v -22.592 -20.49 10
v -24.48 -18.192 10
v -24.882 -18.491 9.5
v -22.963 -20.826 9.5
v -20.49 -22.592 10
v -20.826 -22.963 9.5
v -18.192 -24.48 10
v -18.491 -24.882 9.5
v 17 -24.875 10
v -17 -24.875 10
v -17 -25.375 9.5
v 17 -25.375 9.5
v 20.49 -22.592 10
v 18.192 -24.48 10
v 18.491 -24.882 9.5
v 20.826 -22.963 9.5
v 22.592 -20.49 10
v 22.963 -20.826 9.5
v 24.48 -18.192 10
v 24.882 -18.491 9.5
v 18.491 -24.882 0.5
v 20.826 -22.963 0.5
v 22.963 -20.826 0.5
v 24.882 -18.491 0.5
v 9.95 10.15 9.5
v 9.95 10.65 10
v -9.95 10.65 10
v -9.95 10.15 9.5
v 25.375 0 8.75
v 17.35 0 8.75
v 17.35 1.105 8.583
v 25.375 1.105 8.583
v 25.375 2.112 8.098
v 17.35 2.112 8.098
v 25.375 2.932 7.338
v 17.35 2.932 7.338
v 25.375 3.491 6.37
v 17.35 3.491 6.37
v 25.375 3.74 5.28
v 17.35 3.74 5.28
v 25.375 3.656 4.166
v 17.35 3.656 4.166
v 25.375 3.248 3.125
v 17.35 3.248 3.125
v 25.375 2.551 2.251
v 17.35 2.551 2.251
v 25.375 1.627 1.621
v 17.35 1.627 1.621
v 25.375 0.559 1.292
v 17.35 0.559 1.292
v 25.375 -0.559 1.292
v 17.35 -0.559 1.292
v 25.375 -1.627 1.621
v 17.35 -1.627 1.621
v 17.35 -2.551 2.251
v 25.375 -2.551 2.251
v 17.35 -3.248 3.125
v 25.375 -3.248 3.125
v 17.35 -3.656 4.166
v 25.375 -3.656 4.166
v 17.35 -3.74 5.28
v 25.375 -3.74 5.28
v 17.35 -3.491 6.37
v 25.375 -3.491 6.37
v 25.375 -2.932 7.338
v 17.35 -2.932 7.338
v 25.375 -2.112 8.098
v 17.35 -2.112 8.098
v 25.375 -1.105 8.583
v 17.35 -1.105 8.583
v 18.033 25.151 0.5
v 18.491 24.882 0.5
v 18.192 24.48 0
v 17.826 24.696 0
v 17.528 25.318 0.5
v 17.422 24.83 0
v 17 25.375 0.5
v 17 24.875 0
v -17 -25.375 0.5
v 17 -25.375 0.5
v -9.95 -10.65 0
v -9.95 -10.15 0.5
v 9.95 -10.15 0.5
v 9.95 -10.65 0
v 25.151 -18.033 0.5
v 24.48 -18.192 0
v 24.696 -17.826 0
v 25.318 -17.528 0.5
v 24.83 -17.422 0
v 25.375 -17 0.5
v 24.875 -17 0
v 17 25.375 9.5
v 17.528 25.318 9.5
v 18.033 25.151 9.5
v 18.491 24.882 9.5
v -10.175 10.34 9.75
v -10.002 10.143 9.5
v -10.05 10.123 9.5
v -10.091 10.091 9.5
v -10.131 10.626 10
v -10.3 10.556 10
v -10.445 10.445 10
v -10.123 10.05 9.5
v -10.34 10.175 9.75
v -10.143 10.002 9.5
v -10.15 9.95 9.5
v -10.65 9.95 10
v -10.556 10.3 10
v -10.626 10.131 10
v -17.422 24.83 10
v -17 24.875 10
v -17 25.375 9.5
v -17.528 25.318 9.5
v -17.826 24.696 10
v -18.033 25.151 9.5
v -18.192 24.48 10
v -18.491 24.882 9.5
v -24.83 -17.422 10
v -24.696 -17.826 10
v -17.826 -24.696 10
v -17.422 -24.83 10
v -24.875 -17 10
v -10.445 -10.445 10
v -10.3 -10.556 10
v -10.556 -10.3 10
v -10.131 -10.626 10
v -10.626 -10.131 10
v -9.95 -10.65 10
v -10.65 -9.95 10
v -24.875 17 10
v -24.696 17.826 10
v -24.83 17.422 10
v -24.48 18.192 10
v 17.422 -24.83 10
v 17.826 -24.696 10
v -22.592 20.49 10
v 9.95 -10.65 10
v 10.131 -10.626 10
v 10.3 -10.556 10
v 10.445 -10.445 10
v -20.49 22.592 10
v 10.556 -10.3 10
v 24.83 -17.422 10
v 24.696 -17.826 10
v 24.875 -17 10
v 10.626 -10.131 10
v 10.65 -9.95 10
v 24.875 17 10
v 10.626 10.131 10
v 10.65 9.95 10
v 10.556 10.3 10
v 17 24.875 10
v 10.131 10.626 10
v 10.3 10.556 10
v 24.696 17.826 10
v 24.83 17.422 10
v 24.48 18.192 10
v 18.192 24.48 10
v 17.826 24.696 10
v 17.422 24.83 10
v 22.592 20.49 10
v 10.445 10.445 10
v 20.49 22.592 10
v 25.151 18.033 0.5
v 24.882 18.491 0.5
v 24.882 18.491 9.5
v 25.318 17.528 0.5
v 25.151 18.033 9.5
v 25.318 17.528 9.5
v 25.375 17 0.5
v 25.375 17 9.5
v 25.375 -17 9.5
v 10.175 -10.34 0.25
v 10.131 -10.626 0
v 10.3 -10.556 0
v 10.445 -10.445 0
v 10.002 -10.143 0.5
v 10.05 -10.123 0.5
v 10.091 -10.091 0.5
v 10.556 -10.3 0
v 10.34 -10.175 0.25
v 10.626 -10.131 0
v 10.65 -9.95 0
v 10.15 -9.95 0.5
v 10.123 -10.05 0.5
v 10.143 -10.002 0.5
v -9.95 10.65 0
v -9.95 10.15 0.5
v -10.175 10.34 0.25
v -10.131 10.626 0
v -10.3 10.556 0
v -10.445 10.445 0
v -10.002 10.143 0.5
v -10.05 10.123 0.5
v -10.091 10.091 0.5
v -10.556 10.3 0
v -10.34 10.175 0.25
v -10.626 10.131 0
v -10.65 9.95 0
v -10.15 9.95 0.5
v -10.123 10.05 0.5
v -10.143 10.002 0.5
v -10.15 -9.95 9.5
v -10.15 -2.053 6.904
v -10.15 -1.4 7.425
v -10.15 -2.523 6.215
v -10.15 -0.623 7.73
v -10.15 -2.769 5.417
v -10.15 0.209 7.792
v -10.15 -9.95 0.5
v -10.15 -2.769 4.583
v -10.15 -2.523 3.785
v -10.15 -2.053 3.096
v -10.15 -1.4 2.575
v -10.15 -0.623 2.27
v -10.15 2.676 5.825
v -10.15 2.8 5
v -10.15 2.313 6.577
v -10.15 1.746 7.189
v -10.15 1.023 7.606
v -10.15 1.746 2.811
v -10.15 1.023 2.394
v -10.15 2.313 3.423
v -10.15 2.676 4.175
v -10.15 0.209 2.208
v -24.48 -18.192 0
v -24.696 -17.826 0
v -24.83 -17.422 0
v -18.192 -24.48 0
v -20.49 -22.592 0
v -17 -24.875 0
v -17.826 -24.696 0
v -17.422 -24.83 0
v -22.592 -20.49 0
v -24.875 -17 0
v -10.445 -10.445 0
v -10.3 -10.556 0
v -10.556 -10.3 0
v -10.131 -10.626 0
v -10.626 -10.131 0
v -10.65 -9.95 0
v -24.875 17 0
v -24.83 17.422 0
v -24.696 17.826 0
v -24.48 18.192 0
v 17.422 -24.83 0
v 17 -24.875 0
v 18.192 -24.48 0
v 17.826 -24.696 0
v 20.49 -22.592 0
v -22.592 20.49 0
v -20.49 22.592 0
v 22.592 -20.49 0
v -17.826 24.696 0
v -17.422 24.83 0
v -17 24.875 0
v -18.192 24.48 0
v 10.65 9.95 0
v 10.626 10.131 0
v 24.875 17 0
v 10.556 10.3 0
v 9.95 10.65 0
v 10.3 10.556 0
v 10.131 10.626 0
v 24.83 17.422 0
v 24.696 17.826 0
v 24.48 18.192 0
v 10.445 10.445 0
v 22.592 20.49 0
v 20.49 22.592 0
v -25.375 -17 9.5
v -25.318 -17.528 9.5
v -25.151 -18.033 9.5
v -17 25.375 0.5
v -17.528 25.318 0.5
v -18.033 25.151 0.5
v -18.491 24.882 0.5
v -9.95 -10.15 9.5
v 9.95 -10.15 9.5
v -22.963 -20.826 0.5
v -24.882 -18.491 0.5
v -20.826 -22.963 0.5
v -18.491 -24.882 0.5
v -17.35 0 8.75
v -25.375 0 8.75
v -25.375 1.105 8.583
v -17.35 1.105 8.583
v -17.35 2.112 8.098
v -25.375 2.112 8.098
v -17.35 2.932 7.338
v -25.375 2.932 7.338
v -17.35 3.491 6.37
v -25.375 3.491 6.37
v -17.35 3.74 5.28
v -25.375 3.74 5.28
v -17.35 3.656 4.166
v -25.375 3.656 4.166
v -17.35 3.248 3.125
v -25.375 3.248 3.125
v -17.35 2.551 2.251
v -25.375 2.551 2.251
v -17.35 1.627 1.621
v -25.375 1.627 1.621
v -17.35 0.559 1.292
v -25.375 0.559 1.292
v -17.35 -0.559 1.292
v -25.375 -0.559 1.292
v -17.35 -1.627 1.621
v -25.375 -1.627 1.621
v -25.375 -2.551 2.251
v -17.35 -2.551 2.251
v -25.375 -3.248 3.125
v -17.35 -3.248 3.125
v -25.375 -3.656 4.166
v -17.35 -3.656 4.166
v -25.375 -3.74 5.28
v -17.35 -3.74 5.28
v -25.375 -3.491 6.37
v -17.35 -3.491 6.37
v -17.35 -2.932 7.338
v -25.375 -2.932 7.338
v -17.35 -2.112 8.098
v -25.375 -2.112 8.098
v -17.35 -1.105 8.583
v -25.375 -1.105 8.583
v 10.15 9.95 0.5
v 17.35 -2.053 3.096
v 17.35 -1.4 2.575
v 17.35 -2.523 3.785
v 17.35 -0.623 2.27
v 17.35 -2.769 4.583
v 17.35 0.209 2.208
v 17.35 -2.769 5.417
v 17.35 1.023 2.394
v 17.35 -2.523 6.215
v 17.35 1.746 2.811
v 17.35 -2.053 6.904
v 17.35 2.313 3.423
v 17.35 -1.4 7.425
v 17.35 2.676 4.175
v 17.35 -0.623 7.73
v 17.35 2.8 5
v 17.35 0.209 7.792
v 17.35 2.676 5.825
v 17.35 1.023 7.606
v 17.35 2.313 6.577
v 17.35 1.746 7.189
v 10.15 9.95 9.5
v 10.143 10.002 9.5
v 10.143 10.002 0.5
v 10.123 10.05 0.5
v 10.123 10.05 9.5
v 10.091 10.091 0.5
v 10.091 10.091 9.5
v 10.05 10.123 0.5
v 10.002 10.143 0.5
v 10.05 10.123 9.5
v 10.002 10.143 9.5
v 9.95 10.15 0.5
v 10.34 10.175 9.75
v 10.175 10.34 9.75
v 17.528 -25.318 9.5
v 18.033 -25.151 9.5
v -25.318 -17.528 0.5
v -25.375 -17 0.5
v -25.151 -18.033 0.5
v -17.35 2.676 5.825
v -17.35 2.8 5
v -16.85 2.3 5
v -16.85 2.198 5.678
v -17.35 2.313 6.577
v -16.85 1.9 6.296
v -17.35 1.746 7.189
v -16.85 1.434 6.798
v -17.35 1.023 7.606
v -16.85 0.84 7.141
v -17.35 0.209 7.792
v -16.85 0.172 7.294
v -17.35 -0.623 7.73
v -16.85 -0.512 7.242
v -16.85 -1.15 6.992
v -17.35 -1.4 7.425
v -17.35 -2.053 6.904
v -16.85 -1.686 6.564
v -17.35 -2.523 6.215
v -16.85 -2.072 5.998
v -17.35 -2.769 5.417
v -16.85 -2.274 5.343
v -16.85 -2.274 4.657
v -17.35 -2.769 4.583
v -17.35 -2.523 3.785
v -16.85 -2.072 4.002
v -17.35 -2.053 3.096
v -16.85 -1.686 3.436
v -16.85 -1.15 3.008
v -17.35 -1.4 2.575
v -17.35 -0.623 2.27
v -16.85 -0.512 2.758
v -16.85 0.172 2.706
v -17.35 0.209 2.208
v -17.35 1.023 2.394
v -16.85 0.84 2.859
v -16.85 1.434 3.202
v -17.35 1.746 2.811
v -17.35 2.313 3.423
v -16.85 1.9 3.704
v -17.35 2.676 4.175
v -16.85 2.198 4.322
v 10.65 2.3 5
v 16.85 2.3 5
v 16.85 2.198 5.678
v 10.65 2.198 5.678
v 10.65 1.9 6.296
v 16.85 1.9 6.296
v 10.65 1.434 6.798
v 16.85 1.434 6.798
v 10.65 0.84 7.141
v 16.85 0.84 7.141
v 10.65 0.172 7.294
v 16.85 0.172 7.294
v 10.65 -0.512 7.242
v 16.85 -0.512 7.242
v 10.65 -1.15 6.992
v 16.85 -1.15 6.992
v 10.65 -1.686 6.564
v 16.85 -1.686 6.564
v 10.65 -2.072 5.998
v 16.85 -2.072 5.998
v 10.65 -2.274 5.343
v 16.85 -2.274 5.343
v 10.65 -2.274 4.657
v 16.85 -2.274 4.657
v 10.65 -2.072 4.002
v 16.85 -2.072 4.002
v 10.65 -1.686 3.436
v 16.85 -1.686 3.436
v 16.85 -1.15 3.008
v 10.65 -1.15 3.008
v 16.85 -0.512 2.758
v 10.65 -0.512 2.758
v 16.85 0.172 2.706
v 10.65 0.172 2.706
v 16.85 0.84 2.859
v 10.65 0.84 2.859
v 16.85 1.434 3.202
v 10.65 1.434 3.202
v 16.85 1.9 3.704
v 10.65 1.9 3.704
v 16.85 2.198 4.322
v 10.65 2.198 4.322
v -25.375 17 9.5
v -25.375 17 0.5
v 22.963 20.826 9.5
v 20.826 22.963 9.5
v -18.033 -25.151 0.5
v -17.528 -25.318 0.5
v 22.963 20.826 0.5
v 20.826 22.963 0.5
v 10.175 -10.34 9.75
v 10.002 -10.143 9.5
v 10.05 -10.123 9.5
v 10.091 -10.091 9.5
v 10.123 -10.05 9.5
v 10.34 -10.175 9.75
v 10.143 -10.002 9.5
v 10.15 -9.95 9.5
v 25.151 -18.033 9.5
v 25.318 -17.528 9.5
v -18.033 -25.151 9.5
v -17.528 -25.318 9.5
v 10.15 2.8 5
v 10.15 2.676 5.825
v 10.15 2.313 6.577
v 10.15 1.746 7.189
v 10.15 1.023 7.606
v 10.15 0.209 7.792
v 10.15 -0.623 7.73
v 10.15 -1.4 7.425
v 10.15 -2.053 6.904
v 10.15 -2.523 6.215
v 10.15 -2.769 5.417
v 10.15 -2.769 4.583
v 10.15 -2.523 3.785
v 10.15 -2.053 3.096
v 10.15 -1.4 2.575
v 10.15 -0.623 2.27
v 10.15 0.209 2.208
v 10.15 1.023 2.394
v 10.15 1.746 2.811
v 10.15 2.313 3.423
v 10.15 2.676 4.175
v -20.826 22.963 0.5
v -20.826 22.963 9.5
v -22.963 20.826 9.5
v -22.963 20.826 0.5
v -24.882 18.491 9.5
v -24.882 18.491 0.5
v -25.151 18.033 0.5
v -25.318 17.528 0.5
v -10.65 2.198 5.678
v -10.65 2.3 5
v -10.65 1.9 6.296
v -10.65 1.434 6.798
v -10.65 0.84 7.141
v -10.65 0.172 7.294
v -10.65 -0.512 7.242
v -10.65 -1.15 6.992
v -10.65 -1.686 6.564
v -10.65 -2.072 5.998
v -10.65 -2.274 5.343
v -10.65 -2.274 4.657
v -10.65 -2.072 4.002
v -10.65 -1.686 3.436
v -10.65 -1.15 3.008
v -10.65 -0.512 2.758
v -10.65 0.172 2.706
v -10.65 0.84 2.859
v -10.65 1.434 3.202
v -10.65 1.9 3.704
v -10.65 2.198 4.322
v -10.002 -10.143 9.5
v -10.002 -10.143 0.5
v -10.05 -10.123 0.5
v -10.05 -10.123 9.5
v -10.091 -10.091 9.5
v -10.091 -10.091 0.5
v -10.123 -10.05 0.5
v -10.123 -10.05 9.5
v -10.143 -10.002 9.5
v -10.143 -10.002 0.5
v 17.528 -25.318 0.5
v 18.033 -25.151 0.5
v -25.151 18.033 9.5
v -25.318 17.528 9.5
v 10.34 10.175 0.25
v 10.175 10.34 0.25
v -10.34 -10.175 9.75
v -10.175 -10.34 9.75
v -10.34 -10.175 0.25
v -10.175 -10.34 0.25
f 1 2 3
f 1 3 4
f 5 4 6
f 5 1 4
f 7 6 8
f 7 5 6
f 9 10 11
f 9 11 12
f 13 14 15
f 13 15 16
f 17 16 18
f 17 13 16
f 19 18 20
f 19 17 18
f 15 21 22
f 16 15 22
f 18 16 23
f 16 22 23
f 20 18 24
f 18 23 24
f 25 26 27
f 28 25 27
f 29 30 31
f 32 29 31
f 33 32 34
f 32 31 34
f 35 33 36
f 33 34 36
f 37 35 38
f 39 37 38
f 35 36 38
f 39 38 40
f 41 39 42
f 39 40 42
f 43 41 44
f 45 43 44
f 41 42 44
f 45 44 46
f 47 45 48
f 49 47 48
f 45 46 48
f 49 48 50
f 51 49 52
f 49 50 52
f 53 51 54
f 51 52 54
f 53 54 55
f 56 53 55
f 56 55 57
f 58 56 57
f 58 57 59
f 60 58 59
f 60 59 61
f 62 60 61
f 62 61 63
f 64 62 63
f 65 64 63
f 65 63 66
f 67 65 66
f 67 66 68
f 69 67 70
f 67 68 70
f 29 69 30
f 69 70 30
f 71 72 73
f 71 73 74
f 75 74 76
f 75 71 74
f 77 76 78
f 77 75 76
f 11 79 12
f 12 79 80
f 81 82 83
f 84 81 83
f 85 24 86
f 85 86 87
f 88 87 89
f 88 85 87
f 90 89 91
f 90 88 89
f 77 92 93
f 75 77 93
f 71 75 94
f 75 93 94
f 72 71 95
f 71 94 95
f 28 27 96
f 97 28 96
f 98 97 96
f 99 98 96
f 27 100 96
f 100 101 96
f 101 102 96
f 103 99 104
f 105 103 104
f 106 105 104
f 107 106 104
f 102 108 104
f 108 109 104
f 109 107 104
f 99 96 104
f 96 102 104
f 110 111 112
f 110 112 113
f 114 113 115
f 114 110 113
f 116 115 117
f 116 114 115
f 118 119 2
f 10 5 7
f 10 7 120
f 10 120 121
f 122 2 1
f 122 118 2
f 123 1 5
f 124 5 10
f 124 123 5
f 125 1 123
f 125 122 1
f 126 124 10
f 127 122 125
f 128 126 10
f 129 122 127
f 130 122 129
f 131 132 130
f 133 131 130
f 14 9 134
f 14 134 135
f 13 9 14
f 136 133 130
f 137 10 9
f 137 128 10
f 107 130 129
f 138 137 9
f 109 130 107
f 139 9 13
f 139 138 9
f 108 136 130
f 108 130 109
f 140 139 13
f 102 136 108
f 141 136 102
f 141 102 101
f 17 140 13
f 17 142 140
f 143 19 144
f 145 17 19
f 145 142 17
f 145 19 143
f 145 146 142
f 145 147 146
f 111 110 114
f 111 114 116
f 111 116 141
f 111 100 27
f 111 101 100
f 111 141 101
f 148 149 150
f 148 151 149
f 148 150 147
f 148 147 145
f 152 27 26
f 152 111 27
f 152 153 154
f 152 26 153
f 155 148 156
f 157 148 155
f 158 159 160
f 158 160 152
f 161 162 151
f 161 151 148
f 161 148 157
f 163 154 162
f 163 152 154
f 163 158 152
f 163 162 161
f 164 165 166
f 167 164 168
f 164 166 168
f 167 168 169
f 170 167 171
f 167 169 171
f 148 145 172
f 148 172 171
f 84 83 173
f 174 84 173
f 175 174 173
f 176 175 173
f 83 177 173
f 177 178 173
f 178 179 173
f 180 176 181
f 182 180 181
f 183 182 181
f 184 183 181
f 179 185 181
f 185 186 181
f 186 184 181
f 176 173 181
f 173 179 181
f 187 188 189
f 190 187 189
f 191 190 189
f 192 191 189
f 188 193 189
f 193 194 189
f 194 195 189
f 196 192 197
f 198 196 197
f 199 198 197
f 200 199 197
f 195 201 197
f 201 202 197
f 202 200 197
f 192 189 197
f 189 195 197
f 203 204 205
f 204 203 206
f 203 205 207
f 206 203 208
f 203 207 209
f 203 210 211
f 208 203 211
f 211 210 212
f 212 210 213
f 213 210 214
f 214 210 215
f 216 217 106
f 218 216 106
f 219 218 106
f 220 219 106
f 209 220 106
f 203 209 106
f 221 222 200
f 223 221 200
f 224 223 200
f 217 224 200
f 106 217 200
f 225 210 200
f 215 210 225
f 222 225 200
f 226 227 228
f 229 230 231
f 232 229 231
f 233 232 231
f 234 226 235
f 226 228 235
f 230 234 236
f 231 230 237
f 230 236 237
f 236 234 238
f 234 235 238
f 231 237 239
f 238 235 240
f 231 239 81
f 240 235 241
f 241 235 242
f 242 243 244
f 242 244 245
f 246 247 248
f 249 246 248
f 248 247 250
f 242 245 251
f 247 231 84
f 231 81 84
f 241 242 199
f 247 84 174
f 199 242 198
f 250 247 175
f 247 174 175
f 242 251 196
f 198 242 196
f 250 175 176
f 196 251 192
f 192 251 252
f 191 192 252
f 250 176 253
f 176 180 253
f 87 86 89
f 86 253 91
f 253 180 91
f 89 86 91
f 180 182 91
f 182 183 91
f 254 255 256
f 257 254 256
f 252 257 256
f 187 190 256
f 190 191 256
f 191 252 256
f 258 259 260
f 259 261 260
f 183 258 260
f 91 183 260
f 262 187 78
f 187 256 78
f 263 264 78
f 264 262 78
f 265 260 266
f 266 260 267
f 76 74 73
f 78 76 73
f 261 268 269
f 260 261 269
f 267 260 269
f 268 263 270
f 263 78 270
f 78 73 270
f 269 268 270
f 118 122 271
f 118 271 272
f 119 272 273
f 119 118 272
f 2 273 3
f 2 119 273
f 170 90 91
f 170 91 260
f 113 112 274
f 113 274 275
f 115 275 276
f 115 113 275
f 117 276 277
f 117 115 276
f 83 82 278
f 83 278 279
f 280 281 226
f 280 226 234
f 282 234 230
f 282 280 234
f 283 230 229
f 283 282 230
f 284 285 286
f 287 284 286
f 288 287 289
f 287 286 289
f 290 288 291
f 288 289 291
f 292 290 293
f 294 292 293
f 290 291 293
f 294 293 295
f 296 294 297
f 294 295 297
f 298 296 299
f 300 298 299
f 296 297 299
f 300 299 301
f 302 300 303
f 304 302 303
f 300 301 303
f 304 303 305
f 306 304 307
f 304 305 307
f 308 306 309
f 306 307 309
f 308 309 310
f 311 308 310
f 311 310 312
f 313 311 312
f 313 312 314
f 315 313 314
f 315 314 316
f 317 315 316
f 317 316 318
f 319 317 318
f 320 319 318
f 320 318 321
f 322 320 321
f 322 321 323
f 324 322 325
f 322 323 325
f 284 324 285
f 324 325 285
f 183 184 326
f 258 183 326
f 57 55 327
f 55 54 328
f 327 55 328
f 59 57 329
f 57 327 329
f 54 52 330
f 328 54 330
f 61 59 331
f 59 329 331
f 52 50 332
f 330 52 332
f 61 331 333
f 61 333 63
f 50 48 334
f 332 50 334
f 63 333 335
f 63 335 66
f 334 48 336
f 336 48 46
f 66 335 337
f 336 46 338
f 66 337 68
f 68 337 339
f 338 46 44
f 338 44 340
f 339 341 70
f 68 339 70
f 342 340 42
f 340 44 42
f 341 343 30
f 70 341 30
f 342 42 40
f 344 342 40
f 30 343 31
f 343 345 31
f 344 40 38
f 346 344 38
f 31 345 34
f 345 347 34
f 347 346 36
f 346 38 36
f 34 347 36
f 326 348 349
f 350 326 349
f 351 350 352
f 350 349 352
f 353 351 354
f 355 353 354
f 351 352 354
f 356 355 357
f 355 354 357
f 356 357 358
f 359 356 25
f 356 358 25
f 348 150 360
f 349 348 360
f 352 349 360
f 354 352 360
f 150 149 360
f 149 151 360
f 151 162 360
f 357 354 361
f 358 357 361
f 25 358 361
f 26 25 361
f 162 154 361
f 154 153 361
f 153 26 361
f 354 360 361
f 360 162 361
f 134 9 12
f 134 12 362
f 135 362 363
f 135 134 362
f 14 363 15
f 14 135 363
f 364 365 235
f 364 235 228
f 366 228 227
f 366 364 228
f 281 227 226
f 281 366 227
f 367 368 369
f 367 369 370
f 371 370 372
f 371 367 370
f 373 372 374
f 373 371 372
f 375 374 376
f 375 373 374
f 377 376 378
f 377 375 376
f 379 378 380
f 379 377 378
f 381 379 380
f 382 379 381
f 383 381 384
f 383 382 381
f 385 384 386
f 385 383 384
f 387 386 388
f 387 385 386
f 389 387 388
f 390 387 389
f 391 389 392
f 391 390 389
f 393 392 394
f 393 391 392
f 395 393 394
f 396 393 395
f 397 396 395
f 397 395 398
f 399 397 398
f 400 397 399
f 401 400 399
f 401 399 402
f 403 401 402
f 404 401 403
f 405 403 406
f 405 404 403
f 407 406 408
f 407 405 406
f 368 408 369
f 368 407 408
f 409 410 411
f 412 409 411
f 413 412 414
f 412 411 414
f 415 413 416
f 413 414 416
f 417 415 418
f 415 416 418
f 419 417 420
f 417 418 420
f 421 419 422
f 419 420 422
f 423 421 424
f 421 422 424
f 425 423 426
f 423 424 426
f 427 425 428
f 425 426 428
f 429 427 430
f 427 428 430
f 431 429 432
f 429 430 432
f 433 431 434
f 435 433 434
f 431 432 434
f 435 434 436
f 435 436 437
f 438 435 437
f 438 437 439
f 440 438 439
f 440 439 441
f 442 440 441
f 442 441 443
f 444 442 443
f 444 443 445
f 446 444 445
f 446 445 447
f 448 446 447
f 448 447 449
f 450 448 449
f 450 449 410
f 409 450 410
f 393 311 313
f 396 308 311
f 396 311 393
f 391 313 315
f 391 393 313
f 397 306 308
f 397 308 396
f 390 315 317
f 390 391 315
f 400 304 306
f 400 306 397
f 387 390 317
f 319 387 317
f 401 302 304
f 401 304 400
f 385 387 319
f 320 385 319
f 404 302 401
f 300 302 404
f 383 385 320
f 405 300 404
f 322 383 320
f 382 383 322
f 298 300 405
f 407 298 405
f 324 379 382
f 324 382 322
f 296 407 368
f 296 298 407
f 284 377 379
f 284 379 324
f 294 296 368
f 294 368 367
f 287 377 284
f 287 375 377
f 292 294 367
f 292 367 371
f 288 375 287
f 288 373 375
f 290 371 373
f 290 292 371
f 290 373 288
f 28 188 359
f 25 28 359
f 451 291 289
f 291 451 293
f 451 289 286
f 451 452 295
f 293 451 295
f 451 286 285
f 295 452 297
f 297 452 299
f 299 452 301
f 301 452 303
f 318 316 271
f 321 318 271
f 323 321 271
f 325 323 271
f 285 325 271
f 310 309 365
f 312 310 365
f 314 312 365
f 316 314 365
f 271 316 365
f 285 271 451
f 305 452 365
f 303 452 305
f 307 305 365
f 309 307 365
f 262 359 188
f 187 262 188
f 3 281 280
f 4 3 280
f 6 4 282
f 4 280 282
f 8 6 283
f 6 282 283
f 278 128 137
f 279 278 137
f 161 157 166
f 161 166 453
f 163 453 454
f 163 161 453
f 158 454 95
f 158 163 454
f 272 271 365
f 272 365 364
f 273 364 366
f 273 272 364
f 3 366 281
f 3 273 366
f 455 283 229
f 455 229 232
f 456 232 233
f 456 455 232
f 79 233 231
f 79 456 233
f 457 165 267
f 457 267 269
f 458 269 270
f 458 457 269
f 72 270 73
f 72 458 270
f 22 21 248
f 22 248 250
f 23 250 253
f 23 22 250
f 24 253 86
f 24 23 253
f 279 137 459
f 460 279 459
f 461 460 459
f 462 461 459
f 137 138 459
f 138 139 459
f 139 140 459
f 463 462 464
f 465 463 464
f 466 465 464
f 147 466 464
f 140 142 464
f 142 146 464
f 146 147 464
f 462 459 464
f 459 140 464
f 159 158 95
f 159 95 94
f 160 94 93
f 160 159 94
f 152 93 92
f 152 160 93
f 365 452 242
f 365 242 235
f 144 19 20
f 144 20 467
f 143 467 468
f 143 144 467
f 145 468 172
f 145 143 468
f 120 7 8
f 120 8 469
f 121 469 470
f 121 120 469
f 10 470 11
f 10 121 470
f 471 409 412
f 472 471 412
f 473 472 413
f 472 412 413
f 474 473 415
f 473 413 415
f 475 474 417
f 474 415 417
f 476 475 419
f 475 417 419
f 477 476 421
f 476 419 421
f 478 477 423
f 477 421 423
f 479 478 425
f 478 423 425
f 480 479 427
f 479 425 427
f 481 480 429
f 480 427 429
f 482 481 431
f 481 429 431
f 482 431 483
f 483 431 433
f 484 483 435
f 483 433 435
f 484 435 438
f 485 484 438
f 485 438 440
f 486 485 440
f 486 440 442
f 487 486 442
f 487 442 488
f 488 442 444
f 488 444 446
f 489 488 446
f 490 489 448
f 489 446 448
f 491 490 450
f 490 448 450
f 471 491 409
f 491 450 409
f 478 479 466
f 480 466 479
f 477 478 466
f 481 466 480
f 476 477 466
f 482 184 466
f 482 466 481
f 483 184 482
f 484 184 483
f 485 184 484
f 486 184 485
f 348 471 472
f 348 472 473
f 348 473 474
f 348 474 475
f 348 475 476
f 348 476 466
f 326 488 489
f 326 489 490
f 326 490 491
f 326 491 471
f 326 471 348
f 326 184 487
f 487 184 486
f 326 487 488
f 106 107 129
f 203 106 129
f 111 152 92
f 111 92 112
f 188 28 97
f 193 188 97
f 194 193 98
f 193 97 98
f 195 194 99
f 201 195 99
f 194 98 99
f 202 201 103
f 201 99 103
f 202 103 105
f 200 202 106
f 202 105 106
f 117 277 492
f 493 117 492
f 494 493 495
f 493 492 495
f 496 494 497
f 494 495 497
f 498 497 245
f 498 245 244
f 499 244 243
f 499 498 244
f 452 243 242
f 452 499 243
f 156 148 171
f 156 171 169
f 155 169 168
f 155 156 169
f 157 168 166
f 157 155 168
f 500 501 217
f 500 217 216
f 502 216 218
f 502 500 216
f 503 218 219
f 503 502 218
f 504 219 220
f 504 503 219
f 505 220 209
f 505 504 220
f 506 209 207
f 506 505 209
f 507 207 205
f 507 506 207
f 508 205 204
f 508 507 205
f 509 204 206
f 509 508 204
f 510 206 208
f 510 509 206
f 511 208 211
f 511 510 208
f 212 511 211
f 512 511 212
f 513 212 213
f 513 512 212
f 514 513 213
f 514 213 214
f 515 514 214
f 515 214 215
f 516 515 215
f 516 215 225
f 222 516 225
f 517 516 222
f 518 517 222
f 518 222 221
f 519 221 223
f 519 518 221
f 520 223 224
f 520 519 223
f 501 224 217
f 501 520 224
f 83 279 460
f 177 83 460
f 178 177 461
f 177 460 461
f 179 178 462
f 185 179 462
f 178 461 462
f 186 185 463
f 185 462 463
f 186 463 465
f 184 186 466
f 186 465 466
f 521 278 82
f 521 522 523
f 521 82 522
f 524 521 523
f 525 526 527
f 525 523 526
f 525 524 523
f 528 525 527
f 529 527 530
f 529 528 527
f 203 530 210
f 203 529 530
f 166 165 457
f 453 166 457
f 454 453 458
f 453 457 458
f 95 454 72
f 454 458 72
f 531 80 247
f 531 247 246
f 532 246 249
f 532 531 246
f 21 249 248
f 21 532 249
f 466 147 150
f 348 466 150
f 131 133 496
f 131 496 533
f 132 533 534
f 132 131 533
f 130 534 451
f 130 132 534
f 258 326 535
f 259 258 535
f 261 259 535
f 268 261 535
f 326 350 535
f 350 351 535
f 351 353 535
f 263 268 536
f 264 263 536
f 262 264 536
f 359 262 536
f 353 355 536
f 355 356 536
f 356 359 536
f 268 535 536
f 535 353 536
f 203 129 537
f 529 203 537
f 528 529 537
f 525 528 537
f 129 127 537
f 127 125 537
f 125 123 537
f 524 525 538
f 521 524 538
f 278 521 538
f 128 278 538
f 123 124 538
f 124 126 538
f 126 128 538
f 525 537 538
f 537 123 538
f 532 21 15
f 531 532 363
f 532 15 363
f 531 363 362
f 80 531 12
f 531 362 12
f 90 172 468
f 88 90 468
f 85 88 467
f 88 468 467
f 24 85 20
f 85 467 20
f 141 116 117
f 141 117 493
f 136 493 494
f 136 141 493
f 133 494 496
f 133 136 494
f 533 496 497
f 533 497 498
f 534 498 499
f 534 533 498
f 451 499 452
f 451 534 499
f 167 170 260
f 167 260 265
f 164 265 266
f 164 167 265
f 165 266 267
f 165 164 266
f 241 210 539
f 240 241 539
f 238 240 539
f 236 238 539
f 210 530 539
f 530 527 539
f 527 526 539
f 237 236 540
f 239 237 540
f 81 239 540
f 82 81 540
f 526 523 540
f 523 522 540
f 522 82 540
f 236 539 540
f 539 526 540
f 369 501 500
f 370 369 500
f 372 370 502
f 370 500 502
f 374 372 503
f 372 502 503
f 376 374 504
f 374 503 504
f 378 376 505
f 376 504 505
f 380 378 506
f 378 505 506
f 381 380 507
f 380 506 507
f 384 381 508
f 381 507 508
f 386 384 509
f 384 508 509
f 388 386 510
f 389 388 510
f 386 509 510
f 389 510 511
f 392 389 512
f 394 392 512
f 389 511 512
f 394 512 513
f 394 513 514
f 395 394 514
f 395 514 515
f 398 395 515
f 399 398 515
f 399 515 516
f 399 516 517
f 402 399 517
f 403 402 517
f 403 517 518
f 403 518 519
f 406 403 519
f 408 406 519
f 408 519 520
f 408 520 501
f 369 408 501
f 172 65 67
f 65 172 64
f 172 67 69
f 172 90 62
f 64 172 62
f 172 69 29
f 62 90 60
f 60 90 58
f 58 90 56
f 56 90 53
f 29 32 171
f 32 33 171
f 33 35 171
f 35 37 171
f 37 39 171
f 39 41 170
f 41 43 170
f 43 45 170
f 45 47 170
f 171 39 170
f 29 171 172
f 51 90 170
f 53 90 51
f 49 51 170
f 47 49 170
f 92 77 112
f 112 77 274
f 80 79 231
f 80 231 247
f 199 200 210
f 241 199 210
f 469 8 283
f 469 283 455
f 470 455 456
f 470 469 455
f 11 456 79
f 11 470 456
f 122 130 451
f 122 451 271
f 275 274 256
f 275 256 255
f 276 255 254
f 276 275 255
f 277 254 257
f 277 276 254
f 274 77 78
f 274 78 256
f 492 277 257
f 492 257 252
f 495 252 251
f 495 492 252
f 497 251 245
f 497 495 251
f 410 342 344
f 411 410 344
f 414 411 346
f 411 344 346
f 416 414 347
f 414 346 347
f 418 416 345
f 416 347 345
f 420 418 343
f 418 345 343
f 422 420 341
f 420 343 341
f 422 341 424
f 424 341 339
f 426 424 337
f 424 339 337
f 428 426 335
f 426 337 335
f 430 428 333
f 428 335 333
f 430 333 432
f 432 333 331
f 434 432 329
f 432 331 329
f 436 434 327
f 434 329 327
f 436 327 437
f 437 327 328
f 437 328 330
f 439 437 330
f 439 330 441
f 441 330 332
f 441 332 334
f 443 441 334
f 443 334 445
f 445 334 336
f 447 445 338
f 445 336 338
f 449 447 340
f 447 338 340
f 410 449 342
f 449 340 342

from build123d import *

# Parameters (mm, degrees)
SKIZZE1_W                       = 20.3
SKIZZE1_H                       = 20.3
AUFSATZ_LINEAR_AUSTRAGEN1_DEPTH = 10
VERRUNDUNG1_R                   = 0.2
VERRUNDUNG2_R                   = 2.5
SKIZZE2_R                       = 2.3
SCHNITT_LINEAR_AUSTRAGEN1_DEPTH = 58.614695391
SKETCH1_R                       = 3.75
CUT_EXTRUDE1_DEPTH              = 8.025
CUT_EXTRUDE2_START              = -42.725
SKETCH1_2_R                     = 3.75
CUT_EXTRUDE2_DEPTH              = 8.025
FASE2_SIZE                      = 0.5


with BuildPart() as part:
    # Skizze1 → Aufsatz-Linear austragen1 (new body)
    with BuildSketch(Plane.XY):
        with BuildLine():
            Line((17.807565106, 25.375), (-17.807565106, 25.375))
            ThreePointArc((-17.807565106, 25.375), (-21.920310217, 21.920310217), (-25.375, 17.807565106))
            Line((-25.375, 17.807565106), (-25.375, -17.807565106))
            ThreePointArc((-25.375, -17.807565106), (-21.920310217, -21.920310217), (-17.807565106, -25.375))
            Line((-17.807565106, -25.375), (17.807565106, -25.375))
            ThreePointArc((17.807565106, -25.375), (21.920310217, -21.920310217), (25.375, -17.807565106))
            Line((25.375, -17.807565106), (25.375, 17.807565106))
            ThreePointArc((25.375, 17.807565106), (21.920310217, 21.920310217), (17.807565106, 25.375))
        make_face()
        Rectangle(SKIZZE1_W, SKIZZE1_H, mode=Mode.SUBTRACT)
    extrude(amount=AUFSATZ_LINEAR_AUSTRAGEN1_DEPTH)

    # Verrundung1
    verrundung1_edges = [part.edges().sort_by_distance(p)[0] for p in [
        (10.15, -10.15, 5),
        (10.15, 10.15, 5),
        (-10.15, 10.15, 5),
        (-10.15, -10.15, 5),
    ]]
    fillet(verrundung1_edges, radius=VERRUNDUNG1_R)

    # Verrundung2
    verrundung2_edges = [part.edges().sort_by_distance(p)[0] for p in [
        (25.375, 17.807565106, 5),
        (25.375, -17.807565106, 5),
        (17.807565106, -25.375, 5),
        (-17.807565106, -25.375, 5),
        (-25.375, -17.807565106, 5),
        (-25.375, 17.807565106, 5),
        (-17.807565106, 25.375, 5),
        (17.807565106, 25.375, 5),
    ]]
    fillet(verrundung2_edges, radius=VERRUNDUNG2_R)

    # Skizze2 → Schnitt-Linear austragen1 (cut, through all)
    with BuildSketch(Plane(origin=(25.375, 0, 0), x_dir=(0, 0, -1), z_dir=(1, 0, 0))):
        with Locations(Location((-5, 0, 0), (0, 0, 90))):
            Circle(SKIZZE2_R)
    extrude(amount=-SCHNITT_LINEAR_AUSTRAGEN1_DEPTH, mode=Mode.SUBTRACT)

    # Sketch1 → Cut-Extrude1 (cut)
    with BuildSketch(Plane.ZY.offset(25.375)):
        with Locations((5, 0)):
            Circle(SKETCH1_R)
    extrude(amount=-CUT_EXTRUDE1_DEPTH, mode=Mode.SUBTRACT)

    # Sketch1<2> → Cut-Extrude2 (cut)
    with BuildSketch(Plane.ZY.offset(25.375).offset(CUT_EXTRUDE2_START)):
        with Locations((5, 0)):
            Circle(SKETCH1_2_R)
    extrude(amount=-CUT_EXTRUDE2_DEPTH, mode=Mode.SUBTRACT)

    # Fase2
    fase2_edges = [part.edges().sort_by_distance(p)[0] for p in [
        (-10.15, -2.3, 5),
        (10.15, -2.3, 5),
        (-17.35, -2.3, 5),
        (17.35, -2.3, 5),
        (0, -10.15, 0),
        (0, -10.15, 10),
        (10.15, 0, 0),
        (10.15, 0, 10),
        (-10.15, 0, 0),
        (-10.15, 0, 10),
        (0, 10.15, 0),
        (0, 10.15, 10),
        (10.091421356, -10.091421356, 0),
        (10.091421356, -10.091421356, 10),
        (-10.091421356, -10.091421356, 0),
        (-10.091421356, -10.091421356, 10),
        (-10.091421356, 10.091421356, 0),
        (-10.091421356, 10.091421356, 10),
        (10.091421356, 10.091421356, 0),
        (10.091421356, 10.091421356, 10),
        (0, 25.375, 0),
        (0, 25.375, 10),
        (21.920310217, 21.920310217, 0),
        (25.375, 0, 0),
        (21.920310217, -21.920310217, 0),
        (0, -25.375, 0),
        (-21.920310217, -21.920310217, 0),
        (-25.375, 0, 0),
        (-21.920310217, 21.920310217, 0),
        (-17.784891513, 25.248441317, 0),
        (-25.248441317, 17.784891513, 0),
        (-25.248441317, -17.784891513, 0),
        (-17.784891513, -25.248441317, 0),
        (17.784891513, -25.248441317, 0),
        (25.248441317, -17.784891513, 0),
        (25.248441317, 17.784891513, 0),
        (17.784891513, 25.248441317, 0),
        (21.920310217, 21.920310217, 10),
        (-21.920310217, 21.920310217, 10),
        (-25.375, 0, 10),
        (-21.920310217, -21.920310217, 10),
        (0, -25.375, 10),
        (21.920310217, -21.920310217, 10),
        (25.375, 0, 10),
        (-17.784891513, 25.248441317, 10),
        (-25.248441317, 17.784891513, 10),
        (-25.248441317, -17.784891513, 10),
        (-17.784891513, -25.248441317, 10),
        (17.784891513, -25.248441317, 10),
        (25.248441317, -17.784891513, 10),
        (25.248441317, 17.784891513, 10),
        (17.784891513, 25.248441317, 10),
    ]]
    chamfer(fase2_edges, length=FASE2_SIZE)


solid = part.part
